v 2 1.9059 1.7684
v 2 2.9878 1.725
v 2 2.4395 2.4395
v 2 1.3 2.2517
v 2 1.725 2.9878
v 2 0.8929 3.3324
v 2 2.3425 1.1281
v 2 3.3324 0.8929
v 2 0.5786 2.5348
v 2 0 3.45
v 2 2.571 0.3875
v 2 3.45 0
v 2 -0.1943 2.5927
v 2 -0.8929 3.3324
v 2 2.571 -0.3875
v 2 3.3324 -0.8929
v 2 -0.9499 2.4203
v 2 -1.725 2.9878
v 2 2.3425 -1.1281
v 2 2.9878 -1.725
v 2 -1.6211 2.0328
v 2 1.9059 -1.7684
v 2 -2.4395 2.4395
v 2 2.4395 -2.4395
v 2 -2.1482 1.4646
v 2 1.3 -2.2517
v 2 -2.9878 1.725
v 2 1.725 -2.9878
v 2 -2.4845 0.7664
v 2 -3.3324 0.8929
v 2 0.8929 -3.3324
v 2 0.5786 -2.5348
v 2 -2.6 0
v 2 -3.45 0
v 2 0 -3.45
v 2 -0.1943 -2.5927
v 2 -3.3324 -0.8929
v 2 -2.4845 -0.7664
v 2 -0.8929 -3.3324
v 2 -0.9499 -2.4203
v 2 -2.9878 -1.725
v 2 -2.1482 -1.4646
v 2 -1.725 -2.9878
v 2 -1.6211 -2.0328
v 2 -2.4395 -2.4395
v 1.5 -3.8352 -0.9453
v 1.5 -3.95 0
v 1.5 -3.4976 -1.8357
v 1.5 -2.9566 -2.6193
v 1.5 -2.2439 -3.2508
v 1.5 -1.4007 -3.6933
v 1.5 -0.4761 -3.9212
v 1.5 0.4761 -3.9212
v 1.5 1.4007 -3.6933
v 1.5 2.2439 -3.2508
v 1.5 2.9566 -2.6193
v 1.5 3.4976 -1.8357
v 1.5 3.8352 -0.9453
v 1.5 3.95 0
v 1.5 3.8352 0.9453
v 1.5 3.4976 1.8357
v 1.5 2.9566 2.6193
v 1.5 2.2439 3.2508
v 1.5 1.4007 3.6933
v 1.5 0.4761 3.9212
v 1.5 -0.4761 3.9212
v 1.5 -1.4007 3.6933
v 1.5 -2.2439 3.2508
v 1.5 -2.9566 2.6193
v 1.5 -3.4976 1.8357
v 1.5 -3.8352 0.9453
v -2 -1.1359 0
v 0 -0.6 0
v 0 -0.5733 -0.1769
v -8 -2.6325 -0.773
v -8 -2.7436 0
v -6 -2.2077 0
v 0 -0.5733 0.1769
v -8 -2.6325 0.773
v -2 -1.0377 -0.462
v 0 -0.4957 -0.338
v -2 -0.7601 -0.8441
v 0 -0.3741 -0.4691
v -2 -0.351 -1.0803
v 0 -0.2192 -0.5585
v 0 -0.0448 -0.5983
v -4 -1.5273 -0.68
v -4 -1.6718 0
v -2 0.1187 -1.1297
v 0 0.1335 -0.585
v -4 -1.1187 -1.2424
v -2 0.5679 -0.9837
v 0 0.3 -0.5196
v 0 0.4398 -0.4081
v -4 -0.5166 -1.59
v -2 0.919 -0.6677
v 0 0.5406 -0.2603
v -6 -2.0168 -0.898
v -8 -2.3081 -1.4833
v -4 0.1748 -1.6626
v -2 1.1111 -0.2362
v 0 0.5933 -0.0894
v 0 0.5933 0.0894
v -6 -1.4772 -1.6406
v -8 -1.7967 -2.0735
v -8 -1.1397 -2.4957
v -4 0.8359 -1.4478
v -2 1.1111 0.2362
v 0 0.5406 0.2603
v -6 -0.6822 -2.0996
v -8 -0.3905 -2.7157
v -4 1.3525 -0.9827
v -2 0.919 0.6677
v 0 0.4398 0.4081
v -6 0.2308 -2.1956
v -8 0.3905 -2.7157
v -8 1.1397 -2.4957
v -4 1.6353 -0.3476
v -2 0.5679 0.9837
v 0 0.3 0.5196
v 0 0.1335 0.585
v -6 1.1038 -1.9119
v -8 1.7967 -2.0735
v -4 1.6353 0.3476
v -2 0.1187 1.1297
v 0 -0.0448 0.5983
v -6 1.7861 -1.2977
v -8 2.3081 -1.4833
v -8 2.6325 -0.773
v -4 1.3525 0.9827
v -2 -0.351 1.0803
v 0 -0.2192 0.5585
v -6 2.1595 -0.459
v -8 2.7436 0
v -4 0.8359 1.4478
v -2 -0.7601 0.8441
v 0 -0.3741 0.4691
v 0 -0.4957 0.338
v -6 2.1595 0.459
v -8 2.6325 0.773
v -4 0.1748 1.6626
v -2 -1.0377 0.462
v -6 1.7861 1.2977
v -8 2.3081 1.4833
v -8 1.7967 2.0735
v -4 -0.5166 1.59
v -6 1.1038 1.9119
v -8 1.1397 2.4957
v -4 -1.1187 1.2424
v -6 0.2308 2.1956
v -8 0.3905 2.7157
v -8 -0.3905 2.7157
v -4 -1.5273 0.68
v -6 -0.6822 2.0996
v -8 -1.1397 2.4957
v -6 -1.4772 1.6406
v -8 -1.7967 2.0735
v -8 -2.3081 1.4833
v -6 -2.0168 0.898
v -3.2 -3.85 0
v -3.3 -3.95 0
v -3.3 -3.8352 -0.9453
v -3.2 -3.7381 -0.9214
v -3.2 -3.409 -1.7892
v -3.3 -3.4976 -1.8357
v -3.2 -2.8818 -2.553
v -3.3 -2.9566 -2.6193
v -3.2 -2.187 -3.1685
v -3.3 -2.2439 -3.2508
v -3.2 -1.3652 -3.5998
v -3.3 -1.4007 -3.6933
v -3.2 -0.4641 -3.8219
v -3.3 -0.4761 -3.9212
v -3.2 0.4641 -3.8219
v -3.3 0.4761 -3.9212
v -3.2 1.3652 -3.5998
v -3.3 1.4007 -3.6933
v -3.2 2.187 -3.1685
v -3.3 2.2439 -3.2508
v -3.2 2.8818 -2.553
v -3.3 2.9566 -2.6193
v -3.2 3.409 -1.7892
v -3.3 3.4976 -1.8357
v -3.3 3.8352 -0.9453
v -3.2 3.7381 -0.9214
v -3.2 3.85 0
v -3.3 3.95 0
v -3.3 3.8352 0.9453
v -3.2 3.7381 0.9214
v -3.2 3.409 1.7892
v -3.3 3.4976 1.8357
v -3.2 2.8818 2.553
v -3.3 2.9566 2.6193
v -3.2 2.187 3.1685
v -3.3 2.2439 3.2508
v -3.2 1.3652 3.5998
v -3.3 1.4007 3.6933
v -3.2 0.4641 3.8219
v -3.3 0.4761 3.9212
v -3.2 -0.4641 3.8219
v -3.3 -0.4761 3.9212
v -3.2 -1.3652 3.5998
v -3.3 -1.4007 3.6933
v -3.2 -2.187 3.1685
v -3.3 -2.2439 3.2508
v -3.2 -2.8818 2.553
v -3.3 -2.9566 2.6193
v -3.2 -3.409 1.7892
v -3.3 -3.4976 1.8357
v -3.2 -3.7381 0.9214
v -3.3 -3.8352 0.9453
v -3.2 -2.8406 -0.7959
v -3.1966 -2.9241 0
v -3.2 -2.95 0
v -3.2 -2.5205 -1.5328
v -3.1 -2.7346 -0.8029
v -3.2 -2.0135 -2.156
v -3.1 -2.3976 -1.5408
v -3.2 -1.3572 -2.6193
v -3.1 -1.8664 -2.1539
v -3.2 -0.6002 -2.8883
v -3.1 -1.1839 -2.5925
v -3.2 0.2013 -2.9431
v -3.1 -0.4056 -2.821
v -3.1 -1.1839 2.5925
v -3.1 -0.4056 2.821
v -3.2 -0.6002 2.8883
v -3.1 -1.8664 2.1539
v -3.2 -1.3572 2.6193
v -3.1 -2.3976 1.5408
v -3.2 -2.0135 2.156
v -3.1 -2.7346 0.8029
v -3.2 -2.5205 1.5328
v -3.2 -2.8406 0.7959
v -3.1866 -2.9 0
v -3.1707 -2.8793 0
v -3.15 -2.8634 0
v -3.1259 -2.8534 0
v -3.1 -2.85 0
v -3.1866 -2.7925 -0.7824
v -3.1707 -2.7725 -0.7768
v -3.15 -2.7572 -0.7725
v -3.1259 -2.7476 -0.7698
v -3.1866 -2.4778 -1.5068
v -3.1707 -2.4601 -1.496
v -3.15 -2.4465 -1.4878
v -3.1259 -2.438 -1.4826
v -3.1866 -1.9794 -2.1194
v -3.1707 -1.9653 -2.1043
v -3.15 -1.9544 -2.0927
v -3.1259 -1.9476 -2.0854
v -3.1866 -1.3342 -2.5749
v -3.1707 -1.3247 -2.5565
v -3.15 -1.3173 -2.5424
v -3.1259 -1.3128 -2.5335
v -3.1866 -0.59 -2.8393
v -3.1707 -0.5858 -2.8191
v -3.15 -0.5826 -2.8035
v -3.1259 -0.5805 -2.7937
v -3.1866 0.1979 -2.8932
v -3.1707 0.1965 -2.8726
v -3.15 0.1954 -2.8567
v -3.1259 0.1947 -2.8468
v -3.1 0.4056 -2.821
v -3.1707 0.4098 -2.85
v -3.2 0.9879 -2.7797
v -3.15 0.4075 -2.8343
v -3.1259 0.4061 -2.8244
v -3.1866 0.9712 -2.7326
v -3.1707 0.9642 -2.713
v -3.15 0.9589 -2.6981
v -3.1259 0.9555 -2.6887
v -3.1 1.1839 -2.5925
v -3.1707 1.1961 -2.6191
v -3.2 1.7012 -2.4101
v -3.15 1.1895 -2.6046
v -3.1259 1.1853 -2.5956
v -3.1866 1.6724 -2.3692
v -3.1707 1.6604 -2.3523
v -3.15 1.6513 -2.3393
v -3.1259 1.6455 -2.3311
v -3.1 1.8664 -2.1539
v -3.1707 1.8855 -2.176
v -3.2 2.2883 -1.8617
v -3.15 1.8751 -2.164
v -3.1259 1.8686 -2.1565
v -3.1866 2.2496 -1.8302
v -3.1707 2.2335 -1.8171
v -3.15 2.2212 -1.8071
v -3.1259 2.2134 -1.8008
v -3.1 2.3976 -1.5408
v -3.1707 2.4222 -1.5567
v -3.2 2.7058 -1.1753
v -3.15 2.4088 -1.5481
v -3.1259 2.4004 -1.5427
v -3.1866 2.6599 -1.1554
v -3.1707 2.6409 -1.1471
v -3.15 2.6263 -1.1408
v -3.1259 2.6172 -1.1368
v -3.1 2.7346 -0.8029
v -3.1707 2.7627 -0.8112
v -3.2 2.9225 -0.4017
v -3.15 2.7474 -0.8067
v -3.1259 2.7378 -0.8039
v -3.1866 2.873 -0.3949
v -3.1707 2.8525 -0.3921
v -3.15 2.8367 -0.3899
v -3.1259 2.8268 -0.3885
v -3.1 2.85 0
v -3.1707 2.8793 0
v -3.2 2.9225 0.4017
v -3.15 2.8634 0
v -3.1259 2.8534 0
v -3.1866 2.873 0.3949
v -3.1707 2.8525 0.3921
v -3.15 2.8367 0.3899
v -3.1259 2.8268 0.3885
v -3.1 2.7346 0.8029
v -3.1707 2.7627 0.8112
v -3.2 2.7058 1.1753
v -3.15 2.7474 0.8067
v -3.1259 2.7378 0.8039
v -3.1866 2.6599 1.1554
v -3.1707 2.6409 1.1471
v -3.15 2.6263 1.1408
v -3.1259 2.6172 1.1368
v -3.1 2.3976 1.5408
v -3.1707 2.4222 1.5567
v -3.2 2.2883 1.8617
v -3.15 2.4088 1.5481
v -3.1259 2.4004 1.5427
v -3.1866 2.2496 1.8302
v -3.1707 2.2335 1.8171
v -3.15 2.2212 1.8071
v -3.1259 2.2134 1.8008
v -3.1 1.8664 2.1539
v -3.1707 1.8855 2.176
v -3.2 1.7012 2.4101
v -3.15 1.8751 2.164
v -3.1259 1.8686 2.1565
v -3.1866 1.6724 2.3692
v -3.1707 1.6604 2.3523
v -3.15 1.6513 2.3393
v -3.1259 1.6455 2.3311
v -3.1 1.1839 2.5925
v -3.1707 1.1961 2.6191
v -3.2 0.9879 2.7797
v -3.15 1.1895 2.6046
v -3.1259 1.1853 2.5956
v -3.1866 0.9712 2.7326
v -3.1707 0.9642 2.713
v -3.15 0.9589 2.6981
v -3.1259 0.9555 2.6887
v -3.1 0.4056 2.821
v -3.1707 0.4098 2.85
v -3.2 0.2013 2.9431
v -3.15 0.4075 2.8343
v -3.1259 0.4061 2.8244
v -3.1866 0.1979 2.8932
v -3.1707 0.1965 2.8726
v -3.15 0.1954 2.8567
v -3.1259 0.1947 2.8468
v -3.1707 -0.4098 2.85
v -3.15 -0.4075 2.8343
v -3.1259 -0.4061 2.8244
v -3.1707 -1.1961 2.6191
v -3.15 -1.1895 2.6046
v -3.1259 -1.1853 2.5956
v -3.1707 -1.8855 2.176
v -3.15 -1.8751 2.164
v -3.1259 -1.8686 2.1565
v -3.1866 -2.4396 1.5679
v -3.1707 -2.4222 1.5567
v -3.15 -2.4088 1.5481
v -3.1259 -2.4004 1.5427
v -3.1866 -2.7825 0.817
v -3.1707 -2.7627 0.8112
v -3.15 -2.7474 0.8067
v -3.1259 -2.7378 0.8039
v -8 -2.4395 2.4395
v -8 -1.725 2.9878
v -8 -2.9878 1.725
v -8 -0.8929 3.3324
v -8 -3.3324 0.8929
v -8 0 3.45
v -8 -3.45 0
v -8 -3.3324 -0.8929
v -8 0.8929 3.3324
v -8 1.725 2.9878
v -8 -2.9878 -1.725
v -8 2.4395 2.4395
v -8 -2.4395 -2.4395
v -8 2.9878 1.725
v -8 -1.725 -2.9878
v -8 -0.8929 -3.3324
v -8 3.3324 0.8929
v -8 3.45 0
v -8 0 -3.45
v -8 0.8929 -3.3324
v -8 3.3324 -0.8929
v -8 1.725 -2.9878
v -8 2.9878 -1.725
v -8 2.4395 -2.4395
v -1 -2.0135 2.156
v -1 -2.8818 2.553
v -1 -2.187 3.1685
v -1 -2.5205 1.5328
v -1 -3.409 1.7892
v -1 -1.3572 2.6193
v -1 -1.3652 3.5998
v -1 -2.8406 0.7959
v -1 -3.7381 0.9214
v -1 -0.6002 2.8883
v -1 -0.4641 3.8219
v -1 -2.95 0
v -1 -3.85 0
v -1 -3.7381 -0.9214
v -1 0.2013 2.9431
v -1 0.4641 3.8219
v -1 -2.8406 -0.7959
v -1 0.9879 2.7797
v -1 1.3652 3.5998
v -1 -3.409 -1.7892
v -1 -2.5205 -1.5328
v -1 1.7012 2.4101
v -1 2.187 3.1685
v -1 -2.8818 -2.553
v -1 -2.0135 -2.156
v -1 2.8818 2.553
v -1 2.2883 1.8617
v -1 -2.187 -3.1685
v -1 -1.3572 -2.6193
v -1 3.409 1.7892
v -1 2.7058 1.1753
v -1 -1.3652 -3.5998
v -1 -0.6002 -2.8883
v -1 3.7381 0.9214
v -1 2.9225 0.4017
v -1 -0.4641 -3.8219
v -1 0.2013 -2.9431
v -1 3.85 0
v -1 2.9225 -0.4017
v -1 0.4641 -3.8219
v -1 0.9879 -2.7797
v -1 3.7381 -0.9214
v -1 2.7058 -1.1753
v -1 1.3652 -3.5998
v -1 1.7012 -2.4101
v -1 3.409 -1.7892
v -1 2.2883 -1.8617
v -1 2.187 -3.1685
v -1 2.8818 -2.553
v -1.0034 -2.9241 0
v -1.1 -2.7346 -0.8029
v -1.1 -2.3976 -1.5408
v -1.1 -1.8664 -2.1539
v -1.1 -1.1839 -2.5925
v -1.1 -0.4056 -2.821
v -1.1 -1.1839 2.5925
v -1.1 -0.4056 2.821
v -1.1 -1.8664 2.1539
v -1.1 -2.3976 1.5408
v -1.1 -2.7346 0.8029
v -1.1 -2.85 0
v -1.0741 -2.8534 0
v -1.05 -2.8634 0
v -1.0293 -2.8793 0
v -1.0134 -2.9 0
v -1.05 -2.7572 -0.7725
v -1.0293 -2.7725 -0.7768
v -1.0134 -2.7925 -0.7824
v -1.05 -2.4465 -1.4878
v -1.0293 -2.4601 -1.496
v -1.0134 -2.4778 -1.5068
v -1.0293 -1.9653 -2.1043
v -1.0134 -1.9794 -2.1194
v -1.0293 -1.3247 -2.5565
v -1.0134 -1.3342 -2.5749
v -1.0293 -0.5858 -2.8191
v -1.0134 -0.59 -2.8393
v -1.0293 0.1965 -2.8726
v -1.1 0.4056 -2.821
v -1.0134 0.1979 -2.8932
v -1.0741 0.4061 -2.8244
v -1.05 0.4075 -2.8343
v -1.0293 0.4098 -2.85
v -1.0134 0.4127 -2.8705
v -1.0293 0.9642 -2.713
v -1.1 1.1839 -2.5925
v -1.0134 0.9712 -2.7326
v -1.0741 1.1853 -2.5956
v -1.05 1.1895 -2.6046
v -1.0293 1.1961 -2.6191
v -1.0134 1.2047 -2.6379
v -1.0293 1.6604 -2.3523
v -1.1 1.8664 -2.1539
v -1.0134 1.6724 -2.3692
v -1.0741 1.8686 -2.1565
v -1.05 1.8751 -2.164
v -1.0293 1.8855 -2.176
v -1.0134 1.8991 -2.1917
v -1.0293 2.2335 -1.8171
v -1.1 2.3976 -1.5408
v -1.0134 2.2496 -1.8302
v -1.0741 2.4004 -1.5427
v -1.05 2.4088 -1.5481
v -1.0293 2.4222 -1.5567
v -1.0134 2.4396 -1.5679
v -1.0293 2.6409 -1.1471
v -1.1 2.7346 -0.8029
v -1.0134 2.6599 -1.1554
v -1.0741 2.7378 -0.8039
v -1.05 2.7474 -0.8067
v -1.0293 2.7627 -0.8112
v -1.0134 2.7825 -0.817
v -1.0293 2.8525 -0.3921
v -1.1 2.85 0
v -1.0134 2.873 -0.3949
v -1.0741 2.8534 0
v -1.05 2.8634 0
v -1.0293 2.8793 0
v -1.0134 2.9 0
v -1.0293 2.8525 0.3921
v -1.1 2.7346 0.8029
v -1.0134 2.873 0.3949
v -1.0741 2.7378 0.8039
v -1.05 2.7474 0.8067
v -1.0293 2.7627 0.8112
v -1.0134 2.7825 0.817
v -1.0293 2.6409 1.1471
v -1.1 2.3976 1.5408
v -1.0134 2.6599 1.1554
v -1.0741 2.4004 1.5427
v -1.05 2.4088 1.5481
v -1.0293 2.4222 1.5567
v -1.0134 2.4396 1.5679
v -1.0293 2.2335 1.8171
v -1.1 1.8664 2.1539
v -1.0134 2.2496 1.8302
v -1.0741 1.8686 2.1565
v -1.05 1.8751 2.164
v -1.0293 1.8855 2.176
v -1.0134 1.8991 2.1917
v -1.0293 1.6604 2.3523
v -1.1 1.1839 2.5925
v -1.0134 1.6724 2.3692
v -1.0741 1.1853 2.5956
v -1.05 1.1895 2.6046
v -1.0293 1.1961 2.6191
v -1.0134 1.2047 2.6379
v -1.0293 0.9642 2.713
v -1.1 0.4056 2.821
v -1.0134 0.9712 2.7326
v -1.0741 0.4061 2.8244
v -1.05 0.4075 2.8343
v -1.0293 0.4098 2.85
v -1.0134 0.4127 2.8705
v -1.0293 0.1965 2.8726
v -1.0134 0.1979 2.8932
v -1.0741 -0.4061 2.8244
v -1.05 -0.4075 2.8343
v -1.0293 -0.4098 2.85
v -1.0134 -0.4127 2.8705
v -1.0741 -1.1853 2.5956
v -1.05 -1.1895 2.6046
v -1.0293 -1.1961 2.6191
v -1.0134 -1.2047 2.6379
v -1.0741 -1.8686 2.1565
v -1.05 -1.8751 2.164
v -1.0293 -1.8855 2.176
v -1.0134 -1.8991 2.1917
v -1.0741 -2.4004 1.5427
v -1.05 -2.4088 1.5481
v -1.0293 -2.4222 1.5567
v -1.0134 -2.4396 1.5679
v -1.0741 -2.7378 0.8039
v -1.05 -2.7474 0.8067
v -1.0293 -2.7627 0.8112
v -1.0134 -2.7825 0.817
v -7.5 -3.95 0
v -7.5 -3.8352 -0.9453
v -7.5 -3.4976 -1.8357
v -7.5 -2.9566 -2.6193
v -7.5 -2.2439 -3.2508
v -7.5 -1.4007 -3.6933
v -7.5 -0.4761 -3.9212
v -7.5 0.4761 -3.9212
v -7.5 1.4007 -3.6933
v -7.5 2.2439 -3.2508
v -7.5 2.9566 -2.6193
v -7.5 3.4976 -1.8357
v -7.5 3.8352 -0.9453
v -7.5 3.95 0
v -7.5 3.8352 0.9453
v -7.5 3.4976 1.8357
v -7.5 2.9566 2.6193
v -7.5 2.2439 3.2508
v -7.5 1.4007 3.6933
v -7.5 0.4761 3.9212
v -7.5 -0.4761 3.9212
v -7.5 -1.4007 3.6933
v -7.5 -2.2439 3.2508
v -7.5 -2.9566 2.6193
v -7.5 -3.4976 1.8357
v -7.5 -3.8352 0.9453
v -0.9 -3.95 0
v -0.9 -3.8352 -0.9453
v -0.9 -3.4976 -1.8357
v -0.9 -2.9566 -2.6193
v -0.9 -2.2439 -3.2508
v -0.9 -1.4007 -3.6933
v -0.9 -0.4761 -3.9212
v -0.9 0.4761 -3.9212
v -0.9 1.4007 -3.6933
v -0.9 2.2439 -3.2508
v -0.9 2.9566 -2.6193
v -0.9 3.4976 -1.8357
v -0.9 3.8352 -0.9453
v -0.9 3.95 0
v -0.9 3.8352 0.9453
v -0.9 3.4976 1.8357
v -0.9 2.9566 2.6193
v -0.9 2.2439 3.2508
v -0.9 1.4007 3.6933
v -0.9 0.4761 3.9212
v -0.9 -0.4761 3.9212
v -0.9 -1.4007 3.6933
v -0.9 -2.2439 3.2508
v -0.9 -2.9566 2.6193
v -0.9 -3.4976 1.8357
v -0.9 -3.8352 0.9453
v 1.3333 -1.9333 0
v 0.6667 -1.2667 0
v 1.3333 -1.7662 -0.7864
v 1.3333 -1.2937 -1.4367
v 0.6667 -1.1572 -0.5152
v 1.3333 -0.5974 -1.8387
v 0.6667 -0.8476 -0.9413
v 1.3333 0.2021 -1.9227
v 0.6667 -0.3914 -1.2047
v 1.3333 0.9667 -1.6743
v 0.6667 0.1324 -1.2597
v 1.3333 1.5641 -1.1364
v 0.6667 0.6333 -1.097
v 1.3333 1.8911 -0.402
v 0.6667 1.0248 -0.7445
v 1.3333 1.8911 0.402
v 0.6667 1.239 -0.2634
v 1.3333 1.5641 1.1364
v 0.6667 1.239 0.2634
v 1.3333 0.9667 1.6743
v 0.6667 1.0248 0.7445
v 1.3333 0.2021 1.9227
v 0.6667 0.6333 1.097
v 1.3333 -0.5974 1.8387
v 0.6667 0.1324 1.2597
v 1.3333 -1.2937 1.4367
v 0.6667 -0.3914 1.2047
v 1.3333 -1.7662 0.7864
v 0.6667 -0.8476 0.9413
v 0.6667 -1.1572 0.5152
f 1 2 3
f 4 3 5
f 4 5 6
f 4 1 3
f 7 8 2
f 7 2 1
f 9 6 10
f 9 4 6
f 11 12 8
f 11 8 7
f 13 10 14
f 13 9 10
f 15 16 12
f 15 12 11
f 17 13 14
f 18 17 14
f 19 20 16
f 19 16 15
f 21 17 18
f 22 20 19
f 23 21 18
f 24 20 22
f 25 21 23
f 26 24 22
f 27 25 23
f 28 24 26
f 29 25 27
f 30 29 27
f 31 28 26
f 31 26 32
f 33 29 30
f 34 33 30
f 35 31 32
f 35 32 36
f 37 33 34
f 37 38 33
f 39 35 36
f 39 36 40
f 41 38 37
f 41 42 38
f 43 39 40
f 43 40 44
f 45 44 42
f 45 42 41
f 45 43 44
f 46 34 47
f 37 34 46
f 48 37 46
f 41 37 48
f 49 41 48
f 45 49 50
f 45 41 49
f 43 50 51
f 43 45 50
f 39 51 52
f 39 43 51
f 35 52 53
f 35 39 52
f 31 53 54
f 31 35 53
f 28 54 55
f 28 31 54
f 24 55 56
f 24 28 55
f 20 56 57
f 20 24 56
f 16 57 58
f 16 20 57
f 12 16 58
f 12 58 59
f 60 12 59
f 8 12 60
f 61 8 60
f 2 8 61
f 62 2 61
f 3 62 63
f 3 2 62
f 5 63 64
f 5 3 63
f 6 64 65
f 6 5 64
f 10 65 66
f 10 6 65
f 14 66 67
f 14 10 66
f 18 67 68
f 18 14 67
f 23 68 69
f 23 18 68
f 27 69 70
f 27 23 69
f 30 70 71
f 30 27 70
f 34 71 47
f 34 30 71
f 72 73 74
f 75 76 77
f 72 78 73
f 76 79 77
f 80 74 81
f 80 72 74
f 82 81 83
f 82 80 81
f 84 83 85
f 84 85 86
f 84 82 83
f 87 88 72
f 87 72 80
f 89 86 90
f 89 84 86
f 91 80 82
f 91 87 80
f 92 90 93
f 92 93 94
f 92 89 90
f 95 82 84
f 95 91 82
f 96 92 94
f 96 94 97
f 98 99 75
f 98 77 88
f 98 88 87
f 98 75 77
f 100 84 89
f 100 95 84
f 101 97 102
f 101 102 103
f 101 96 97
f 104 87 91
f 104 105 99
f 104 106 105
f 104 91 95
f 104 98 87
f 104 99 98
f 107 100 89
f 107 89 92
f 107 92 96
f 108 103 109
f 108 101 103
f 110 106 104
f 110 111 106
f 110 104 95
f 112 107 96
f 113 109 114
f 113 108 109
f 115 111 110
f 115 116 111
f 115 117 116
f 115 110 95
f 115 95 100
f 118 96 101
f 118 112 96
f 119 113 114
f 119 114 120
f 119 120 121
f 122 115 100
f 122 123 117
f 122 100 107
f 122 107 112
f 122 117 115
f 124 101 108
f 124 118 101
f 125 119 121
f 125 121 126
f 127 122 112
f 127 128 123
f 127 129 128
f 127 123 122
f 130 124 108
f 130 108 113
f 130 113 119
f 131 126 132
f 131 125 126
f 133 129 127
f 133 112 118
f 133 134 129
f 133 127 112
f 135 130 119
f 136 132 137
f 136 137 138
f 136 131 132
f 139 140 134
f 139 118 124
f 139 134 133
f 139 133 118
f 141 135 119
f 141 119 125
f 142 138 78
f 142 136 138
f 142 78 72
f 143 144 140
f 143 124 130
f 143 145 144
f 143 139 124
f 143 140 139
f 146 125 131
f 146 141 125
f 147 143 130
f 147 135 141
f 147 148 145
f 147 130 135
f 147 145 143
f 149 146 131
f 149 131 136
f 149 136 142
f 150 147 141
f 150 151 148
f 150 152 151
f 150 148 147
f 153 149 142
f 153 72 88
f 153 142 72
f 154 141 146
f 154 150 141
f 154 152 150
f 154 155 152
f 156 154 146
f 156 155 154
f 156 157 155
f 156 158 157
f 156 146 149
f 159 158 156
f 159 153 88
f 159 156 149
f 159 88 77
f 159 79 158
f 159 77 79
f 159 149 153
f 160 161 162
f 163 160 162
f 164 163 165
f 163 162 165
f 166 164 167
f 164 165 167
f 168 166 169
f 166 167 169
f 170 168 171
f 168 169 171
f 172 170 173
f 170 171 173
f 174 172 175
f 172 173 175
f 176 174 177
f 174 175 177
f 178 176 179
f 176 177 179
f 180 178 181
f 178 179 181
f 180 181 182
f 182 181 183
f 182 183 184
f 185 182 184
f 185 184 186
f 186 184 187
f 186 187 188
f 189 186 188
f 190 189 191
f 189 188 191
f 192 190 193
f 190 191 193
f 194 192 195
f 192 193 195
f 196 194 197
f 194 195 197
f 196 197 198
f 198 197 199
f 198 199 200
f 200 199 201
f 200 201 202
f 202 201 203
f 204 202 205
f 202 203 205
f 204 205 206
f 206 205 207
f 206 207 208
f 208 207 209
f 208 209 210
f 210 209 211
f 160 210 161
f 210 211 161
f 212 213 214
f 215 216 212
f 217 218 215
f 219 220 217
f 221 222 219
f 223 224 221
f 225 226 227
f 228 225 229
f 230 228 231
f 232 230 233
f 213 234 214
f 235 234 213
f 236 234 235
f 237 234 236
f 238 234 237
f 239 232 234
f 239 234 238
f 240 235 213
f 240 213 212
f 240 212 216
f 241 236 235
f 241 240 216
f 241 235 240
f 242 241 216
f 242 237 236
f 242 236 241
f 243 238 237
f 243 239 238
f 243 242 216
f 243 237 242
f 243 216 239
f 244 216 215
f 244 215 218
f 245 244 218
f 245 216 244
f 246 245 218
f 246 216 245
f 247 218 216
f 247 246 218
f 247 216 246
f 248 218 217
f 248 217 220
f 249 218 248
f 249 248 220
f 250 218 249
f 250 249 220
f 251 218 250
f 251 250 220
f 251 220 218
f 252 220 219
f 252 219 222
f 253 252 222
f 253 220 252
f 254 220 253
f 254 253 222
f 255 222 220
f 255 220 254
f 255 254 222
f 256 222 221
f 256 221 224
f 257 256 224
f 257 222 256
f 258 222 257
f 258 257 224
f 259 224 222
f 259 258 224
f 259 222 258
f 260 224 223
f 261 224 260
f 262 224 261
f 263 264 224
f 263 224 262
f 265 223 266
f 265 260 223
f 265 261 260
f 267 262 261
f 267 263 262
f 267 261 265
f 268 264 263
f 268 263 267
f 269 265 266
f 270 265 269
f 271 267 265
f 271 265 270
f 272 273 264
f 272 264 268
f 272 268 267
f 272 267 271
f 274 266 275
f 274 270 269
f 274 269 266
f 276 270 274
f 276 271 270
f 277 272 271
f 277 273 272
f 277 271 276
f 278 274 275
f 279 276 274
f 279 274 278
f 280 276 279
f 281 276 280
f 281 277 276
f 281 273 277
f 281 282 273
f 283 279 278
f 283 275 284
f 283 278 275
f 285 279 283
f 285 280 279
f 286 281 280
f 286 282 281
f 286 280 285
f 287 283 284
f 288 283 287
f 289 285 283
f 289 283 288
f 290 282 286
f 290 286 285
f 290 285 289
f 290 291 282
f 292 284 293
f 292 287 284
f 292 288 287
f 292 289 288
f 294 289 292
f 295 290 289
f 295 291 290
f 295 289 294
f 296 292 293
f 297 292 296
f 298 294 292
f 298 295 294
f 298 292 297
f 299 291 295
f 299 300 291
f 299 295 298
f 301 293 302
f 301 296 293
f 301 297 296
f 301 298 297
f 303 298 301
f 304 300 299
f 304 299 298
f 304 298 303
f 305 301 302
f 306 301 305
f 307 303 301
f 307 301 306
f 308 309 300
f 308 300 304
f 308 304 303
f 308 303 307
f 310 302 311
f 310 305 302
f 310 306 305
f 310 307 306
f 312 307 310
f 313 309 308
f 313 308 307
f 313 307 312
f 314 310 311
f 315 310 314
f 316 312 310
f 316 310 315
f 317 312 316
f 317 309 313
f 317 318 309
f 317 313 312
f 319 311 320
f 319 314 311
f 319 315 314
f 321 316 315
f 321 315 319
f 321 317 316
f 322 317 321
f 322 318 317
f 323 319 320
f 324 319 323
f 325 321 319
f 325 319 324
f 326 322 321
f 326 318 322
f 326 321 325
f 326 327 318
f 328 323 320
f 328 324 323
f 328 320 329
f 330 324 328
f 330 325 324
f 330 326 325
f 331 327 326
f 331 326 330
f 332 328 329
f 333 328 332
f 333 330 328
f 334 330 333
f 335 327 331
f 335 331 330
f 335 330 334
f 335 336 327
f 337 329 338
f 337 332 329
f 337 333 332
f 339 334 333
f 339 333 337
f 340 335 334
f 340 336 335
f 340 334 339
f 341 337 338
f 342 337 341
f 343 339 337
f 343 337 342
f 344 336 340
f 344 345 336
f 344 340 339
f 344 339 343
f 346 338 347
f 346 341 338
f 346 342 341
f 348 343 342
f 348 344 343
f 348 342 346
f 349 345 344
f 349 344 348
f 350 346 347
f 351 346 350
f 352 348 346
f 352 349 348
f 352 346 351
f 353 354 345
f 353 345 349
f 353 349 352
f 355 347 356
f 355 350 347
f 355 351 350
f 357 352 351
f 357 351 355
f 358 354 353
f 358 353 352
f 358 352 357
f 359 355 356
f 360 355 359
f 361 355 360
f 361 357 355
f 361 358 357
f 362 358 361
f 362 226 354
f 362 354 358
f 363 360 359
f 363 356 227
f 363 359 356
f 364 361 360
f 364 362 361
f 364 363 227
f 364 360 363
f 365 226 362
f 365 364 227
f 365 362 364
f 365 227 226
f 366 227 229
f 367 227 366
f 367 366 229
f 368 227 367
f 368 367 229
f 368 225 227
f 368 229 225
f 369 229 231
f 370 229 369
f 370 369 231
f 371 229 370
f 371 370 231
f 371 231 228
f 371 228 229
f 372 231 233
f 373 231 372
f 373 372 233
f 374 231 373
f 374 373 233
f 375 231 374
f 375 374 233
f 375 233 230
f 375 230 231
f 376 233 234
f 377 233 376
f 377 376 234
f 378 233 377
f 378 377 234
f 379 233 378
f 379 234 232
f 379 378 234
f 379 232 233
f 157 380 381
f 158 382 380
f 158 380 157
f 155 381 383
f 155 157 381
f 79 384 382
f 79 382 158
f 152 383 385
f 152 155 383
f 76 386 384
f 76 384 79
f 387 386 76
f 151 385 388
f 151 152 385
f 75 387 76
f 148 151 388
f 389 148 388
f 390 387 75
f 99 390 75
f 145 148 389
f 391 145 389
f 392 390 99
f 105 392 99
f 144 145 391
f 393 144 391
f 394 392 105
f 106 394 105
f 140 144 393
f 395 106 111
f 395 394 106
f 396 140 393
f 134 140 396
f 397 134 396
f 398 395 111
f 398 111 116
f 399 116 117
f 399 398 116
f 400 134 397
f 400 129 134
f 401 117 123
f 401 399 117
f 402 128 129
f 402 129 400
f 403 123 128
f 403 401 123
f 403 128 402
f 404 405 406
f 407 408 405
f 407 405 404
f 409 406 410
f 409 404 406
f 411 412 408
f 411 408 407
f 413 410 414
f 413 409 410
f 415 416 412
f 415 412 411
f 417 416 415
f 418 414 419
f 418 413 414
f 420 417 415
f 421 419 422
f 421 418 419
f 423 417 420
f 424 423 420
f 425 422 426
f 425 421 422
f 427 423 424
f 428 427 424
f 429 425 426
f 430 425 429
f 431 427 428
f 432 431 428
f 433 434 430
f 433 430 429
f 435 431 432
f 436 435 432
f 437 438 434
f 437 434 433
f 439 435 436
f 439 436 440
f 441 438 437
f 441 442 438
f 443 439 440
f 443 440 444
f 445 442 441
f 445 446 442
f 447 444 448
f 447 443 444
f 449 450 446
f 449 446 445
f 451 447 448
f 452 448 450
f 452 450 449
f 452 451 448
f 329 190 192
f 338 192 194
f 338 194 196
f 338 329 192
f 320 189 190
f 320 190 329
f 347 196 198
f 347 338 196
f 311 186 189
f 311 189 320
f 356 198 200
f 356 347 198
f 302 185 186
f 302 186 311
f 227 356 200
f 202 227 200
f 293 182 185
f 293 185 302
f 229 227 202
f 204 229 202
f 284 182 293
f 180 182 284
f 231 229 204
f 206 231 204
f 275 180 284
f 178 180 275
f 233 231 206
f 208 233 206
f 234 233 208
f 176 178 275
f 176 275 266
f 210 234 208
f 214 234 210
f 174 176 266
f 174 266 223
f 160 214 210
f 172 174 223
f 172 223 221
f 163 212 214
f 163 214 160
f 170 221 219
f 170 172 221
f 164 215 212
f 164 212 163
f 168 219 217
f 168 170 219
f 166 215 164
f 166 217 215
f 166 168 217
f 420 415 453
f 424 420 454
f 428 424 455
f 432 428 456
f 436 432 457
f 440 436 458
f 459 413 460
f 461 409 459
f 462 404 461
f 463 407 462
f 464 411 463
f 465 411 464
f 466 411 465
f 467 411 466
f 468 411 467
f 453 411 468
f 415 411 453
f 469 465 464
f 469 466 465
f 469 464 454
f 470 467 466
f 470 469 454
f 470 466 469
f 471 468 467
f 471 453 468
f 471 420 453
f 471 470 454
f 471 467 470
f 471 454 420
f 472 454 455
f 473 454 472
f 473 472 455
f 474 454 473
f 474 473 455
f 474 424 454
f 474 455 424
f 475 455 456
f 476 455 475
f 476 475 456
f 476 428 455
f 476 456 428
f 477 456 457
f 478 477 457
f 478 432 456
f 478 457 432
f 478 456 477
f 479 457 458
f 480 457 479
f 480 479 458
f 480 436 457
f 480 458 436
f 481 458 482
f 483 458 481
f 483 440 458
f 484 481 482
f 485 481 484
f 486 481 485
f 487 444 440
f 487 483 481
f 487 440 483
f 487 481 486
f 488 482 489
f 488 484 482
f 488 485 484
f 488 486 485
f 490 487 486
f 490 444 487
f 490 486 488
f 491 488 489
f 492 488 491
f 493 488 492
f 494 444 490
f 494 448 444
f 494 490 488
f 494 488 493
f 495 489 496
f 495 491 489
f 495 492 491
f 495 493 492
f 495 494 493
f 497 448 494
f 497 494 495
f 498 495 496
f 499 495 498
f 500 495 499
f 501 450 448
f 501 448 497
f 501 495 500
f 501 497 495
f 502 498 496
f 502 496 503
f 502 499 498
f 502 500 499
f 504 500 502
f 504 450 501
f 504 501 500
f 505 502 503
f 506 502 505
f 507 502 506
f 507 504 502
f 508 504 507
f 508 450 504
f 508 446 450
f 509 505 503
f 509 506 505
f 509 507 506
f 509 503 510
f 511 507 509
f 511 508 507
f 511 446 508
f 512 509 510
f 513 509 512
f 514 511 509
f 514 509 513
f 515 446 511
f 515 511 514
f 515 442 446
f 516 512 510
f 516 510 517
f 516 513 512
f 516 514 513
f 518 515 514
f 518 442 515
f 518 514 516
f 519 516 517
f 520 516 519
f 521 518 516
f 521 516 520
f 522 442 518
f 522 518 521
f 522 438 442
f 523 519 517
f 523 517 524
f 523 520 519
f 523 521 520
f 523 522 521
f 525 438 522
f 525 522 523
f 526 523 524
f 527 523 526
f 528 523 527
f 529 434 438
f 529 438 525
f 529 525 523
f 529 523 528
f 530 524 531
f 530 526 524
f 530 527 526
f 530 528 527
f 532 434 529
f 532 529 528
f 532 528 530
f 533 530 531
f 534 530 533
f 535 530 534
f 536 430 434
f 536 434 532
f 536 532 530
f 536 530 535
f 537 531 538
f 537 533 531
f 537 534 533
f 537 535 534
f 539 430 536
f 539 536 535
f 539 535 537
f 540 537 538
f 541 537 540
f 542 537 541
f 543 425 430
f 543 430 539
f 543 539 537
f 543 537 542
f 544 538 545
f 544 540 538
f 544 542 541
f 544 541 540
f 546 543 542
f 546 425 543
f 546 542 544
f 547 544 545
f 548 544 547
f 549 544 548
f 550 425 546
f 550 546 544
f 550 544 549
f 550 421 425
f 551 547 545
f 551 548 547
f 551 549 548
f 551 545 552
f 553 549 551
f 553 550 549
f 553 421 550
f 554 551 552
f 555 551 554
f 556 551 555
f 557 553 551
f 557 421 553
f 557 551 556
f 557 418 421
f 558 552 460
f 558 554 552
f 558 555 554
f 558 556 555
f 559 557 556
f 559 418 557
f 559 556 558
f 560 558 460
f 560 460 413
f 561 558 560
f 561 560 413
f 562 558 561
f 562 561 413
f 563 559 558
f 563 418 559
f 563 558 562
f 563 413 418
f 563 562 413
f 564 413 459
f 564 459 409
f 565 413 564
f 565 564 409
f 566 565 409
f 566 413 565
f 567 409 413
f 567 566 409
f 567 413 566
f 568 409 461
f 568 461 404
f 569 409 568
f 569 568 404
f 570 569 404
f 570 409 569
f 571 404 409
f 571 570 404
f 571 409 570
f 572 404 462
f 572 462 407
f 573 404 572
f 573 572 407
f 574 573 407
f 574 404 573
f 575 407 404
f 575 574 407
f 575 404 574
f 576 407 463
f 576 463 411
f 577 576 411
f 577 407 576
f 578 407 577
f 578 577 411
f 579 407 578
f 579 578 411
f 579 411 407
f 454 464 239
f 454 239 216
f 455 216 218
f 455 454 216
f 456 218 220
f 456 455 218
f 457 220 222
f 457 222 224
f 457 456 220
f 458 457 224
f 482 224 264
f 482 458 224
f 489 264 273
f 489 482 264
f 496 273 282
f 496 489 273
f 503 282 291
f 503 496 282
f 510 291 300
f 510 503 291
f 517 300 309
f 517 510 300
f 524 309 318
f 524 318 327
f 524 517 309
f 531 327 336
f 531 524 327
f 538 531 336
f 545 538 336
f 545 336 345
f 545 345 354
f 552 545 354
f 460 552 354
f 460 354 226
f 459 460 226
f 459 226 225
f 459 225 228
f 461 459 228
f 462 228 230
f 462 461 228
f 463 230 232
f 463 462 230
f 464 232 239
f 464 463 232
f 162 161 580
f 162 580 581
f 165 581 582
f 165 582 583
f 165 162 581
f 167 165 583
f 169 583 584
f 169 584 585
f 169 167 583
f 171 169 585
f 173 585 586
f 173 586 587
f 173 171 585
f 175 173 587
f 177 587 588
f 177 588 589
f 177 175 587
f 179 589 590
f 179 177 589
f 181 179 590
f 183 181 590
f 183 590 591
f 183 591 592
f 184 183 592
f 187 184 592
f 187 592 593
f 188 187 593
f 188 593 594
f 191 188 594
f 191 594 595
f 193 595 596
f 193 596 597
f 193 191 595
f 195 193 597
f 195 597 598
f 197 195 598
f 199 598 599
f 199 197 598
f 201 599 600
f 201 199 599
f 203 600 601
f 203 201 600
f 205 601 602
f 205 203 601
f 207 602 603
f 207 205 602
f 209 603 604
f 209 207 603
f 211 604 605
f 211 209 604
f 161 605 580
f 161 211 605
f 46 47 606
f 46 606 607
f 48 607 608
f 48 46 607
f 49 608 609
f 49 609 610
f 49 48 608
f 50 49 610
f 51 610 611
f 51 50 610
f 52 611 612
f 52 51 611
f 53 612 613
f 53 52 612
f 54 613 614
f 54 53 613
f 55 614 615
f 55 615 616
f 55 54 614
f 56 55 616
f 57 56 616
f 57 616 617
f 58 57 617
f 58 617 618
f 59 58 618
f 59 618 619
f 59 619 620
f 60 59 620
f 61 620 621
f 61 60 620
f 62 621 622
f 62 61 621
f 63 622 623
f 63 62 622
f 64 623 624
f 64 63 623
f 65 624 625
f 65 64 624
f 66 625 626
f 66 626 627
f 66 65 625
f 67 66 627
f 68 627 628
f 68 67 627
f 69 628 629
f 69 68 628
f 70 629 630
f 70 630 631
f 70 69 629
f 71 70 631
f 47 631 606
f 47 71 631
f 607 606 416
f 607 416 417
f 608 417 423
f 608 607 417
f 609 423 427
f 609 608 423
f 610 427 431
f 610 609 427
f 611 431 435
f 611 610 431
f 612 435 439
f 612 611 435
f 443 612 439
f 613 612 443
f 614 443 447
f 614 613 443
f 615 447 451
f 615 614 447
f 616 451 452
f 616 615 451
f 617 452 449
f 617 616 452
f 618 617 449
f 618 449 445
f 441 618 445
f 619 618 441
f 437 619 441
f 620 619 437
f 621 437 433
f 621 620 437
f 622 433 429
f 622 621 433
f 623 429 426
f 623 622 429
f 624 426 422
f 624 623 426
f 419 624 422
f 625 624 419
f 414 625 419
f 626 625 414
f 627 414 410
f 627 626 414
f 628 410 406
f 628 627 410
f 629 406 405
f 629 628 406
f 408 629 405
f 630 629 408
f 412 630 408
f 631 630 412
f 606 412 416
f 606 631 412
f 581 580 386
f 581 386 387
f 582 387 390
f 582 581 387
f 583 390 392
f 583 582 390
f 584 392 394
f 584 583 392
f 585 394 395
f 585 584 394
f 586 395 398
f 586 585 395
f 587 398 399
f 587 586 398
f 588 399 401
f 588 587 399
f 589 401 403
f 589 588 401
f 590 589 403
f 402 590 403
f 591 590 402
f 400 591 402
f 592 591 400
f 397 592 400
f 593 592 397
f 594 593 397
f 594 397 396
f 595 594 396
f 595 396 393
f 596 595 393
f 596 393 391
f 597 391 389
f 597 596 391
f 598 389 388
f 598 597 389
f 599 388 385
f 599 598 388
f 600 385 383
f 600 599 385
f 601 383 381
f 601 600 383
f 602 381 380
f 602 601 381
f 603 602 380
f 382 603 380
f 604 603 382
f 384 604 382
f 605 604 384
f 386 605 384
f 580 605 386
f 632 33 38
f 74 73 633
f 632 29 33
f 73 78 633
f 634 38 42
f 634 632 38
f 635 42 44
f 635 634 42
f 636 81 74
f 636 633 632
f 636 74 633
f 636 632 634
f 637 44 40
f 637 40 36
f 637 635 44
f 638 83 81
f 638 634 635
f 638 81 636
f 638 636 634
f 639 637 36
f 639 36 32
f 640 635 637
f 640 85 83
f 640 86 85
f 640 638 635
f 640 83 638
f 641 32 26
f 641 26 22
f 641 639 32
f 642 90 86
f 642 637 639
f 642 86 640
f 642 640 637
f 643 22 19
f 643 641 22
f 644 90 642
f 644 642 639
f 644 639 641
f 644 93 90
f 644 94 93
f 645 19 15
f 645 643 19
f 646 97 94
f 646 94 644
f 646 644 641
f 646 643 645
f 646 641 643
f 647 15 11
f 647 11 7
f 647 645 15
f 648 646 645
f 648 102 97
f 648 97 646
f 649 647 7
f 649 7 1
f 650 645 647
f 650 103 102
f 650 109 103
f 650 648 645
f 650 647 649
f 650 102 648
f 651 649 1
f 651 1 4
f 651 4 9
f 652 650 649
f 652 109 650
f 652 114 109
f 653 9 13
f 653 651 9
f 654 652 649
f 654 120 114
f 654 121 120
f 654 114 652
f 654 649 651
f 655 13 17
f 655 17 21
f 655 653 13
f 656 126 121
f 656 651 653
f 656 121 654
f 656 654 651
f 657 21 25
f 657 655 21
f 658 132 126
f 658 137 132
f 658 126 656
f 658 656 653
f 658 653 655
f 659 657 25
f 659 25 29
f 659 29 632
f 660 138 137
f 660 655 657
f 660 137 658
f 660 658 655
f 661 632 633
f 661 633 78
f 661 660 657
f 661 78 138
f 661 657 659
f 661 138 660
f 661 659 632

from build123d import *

# Parameters (mm, degrees)
CHAMFER1_SIZE = 0.5
FILLET1_R     = 0.1
CHAMFER2_SIZE = 0.1


with BuildPart() as part:
    # Sketch1 → Revolve1 (revolve)
    with BuildSketch(Plane.XY):
        Polygon((-8, -2.743593539), (-8, -3.95), (-3.2, -3.95), (-3.2, -2.85), (-1, -2.85), (-1, -3.95), (2, -3.95), (2, -2.6), (0, -0.6), align=None)
    revolve(axis=Axis((-24.298547045, 0, 0), (1, 0, 0)))

    # Chamfer1
    chamfer1_edges = [part.edges().sort_by_distance(p)[0] for p in [
        (-8, 3.95, 0),
        (2, 3.95, 0),
    ]]
    chamfer(chamfer1_edges, length=CHAMFER1_SIZE)

    # Fillet1
    fillet1_edges = [part.edges().sort_by_distance(p)[0] for p in [
        (-1, 2.85, 0),
        (-3.2, 2.85, 0),
    ]]
    fillet(fillet1_edges, radius=FILLET1_R)

    # Chamfer2
    chamfer2_edges = [part.edges().sort_by_distance(p)[0] for p in [
        (-3.2, 3.95, 0),
        (-1, 3.95, 0),
    ]]
    chamfer(chamfer2_edges, length=CHAMFER2_SIZE)


solid = part.part
